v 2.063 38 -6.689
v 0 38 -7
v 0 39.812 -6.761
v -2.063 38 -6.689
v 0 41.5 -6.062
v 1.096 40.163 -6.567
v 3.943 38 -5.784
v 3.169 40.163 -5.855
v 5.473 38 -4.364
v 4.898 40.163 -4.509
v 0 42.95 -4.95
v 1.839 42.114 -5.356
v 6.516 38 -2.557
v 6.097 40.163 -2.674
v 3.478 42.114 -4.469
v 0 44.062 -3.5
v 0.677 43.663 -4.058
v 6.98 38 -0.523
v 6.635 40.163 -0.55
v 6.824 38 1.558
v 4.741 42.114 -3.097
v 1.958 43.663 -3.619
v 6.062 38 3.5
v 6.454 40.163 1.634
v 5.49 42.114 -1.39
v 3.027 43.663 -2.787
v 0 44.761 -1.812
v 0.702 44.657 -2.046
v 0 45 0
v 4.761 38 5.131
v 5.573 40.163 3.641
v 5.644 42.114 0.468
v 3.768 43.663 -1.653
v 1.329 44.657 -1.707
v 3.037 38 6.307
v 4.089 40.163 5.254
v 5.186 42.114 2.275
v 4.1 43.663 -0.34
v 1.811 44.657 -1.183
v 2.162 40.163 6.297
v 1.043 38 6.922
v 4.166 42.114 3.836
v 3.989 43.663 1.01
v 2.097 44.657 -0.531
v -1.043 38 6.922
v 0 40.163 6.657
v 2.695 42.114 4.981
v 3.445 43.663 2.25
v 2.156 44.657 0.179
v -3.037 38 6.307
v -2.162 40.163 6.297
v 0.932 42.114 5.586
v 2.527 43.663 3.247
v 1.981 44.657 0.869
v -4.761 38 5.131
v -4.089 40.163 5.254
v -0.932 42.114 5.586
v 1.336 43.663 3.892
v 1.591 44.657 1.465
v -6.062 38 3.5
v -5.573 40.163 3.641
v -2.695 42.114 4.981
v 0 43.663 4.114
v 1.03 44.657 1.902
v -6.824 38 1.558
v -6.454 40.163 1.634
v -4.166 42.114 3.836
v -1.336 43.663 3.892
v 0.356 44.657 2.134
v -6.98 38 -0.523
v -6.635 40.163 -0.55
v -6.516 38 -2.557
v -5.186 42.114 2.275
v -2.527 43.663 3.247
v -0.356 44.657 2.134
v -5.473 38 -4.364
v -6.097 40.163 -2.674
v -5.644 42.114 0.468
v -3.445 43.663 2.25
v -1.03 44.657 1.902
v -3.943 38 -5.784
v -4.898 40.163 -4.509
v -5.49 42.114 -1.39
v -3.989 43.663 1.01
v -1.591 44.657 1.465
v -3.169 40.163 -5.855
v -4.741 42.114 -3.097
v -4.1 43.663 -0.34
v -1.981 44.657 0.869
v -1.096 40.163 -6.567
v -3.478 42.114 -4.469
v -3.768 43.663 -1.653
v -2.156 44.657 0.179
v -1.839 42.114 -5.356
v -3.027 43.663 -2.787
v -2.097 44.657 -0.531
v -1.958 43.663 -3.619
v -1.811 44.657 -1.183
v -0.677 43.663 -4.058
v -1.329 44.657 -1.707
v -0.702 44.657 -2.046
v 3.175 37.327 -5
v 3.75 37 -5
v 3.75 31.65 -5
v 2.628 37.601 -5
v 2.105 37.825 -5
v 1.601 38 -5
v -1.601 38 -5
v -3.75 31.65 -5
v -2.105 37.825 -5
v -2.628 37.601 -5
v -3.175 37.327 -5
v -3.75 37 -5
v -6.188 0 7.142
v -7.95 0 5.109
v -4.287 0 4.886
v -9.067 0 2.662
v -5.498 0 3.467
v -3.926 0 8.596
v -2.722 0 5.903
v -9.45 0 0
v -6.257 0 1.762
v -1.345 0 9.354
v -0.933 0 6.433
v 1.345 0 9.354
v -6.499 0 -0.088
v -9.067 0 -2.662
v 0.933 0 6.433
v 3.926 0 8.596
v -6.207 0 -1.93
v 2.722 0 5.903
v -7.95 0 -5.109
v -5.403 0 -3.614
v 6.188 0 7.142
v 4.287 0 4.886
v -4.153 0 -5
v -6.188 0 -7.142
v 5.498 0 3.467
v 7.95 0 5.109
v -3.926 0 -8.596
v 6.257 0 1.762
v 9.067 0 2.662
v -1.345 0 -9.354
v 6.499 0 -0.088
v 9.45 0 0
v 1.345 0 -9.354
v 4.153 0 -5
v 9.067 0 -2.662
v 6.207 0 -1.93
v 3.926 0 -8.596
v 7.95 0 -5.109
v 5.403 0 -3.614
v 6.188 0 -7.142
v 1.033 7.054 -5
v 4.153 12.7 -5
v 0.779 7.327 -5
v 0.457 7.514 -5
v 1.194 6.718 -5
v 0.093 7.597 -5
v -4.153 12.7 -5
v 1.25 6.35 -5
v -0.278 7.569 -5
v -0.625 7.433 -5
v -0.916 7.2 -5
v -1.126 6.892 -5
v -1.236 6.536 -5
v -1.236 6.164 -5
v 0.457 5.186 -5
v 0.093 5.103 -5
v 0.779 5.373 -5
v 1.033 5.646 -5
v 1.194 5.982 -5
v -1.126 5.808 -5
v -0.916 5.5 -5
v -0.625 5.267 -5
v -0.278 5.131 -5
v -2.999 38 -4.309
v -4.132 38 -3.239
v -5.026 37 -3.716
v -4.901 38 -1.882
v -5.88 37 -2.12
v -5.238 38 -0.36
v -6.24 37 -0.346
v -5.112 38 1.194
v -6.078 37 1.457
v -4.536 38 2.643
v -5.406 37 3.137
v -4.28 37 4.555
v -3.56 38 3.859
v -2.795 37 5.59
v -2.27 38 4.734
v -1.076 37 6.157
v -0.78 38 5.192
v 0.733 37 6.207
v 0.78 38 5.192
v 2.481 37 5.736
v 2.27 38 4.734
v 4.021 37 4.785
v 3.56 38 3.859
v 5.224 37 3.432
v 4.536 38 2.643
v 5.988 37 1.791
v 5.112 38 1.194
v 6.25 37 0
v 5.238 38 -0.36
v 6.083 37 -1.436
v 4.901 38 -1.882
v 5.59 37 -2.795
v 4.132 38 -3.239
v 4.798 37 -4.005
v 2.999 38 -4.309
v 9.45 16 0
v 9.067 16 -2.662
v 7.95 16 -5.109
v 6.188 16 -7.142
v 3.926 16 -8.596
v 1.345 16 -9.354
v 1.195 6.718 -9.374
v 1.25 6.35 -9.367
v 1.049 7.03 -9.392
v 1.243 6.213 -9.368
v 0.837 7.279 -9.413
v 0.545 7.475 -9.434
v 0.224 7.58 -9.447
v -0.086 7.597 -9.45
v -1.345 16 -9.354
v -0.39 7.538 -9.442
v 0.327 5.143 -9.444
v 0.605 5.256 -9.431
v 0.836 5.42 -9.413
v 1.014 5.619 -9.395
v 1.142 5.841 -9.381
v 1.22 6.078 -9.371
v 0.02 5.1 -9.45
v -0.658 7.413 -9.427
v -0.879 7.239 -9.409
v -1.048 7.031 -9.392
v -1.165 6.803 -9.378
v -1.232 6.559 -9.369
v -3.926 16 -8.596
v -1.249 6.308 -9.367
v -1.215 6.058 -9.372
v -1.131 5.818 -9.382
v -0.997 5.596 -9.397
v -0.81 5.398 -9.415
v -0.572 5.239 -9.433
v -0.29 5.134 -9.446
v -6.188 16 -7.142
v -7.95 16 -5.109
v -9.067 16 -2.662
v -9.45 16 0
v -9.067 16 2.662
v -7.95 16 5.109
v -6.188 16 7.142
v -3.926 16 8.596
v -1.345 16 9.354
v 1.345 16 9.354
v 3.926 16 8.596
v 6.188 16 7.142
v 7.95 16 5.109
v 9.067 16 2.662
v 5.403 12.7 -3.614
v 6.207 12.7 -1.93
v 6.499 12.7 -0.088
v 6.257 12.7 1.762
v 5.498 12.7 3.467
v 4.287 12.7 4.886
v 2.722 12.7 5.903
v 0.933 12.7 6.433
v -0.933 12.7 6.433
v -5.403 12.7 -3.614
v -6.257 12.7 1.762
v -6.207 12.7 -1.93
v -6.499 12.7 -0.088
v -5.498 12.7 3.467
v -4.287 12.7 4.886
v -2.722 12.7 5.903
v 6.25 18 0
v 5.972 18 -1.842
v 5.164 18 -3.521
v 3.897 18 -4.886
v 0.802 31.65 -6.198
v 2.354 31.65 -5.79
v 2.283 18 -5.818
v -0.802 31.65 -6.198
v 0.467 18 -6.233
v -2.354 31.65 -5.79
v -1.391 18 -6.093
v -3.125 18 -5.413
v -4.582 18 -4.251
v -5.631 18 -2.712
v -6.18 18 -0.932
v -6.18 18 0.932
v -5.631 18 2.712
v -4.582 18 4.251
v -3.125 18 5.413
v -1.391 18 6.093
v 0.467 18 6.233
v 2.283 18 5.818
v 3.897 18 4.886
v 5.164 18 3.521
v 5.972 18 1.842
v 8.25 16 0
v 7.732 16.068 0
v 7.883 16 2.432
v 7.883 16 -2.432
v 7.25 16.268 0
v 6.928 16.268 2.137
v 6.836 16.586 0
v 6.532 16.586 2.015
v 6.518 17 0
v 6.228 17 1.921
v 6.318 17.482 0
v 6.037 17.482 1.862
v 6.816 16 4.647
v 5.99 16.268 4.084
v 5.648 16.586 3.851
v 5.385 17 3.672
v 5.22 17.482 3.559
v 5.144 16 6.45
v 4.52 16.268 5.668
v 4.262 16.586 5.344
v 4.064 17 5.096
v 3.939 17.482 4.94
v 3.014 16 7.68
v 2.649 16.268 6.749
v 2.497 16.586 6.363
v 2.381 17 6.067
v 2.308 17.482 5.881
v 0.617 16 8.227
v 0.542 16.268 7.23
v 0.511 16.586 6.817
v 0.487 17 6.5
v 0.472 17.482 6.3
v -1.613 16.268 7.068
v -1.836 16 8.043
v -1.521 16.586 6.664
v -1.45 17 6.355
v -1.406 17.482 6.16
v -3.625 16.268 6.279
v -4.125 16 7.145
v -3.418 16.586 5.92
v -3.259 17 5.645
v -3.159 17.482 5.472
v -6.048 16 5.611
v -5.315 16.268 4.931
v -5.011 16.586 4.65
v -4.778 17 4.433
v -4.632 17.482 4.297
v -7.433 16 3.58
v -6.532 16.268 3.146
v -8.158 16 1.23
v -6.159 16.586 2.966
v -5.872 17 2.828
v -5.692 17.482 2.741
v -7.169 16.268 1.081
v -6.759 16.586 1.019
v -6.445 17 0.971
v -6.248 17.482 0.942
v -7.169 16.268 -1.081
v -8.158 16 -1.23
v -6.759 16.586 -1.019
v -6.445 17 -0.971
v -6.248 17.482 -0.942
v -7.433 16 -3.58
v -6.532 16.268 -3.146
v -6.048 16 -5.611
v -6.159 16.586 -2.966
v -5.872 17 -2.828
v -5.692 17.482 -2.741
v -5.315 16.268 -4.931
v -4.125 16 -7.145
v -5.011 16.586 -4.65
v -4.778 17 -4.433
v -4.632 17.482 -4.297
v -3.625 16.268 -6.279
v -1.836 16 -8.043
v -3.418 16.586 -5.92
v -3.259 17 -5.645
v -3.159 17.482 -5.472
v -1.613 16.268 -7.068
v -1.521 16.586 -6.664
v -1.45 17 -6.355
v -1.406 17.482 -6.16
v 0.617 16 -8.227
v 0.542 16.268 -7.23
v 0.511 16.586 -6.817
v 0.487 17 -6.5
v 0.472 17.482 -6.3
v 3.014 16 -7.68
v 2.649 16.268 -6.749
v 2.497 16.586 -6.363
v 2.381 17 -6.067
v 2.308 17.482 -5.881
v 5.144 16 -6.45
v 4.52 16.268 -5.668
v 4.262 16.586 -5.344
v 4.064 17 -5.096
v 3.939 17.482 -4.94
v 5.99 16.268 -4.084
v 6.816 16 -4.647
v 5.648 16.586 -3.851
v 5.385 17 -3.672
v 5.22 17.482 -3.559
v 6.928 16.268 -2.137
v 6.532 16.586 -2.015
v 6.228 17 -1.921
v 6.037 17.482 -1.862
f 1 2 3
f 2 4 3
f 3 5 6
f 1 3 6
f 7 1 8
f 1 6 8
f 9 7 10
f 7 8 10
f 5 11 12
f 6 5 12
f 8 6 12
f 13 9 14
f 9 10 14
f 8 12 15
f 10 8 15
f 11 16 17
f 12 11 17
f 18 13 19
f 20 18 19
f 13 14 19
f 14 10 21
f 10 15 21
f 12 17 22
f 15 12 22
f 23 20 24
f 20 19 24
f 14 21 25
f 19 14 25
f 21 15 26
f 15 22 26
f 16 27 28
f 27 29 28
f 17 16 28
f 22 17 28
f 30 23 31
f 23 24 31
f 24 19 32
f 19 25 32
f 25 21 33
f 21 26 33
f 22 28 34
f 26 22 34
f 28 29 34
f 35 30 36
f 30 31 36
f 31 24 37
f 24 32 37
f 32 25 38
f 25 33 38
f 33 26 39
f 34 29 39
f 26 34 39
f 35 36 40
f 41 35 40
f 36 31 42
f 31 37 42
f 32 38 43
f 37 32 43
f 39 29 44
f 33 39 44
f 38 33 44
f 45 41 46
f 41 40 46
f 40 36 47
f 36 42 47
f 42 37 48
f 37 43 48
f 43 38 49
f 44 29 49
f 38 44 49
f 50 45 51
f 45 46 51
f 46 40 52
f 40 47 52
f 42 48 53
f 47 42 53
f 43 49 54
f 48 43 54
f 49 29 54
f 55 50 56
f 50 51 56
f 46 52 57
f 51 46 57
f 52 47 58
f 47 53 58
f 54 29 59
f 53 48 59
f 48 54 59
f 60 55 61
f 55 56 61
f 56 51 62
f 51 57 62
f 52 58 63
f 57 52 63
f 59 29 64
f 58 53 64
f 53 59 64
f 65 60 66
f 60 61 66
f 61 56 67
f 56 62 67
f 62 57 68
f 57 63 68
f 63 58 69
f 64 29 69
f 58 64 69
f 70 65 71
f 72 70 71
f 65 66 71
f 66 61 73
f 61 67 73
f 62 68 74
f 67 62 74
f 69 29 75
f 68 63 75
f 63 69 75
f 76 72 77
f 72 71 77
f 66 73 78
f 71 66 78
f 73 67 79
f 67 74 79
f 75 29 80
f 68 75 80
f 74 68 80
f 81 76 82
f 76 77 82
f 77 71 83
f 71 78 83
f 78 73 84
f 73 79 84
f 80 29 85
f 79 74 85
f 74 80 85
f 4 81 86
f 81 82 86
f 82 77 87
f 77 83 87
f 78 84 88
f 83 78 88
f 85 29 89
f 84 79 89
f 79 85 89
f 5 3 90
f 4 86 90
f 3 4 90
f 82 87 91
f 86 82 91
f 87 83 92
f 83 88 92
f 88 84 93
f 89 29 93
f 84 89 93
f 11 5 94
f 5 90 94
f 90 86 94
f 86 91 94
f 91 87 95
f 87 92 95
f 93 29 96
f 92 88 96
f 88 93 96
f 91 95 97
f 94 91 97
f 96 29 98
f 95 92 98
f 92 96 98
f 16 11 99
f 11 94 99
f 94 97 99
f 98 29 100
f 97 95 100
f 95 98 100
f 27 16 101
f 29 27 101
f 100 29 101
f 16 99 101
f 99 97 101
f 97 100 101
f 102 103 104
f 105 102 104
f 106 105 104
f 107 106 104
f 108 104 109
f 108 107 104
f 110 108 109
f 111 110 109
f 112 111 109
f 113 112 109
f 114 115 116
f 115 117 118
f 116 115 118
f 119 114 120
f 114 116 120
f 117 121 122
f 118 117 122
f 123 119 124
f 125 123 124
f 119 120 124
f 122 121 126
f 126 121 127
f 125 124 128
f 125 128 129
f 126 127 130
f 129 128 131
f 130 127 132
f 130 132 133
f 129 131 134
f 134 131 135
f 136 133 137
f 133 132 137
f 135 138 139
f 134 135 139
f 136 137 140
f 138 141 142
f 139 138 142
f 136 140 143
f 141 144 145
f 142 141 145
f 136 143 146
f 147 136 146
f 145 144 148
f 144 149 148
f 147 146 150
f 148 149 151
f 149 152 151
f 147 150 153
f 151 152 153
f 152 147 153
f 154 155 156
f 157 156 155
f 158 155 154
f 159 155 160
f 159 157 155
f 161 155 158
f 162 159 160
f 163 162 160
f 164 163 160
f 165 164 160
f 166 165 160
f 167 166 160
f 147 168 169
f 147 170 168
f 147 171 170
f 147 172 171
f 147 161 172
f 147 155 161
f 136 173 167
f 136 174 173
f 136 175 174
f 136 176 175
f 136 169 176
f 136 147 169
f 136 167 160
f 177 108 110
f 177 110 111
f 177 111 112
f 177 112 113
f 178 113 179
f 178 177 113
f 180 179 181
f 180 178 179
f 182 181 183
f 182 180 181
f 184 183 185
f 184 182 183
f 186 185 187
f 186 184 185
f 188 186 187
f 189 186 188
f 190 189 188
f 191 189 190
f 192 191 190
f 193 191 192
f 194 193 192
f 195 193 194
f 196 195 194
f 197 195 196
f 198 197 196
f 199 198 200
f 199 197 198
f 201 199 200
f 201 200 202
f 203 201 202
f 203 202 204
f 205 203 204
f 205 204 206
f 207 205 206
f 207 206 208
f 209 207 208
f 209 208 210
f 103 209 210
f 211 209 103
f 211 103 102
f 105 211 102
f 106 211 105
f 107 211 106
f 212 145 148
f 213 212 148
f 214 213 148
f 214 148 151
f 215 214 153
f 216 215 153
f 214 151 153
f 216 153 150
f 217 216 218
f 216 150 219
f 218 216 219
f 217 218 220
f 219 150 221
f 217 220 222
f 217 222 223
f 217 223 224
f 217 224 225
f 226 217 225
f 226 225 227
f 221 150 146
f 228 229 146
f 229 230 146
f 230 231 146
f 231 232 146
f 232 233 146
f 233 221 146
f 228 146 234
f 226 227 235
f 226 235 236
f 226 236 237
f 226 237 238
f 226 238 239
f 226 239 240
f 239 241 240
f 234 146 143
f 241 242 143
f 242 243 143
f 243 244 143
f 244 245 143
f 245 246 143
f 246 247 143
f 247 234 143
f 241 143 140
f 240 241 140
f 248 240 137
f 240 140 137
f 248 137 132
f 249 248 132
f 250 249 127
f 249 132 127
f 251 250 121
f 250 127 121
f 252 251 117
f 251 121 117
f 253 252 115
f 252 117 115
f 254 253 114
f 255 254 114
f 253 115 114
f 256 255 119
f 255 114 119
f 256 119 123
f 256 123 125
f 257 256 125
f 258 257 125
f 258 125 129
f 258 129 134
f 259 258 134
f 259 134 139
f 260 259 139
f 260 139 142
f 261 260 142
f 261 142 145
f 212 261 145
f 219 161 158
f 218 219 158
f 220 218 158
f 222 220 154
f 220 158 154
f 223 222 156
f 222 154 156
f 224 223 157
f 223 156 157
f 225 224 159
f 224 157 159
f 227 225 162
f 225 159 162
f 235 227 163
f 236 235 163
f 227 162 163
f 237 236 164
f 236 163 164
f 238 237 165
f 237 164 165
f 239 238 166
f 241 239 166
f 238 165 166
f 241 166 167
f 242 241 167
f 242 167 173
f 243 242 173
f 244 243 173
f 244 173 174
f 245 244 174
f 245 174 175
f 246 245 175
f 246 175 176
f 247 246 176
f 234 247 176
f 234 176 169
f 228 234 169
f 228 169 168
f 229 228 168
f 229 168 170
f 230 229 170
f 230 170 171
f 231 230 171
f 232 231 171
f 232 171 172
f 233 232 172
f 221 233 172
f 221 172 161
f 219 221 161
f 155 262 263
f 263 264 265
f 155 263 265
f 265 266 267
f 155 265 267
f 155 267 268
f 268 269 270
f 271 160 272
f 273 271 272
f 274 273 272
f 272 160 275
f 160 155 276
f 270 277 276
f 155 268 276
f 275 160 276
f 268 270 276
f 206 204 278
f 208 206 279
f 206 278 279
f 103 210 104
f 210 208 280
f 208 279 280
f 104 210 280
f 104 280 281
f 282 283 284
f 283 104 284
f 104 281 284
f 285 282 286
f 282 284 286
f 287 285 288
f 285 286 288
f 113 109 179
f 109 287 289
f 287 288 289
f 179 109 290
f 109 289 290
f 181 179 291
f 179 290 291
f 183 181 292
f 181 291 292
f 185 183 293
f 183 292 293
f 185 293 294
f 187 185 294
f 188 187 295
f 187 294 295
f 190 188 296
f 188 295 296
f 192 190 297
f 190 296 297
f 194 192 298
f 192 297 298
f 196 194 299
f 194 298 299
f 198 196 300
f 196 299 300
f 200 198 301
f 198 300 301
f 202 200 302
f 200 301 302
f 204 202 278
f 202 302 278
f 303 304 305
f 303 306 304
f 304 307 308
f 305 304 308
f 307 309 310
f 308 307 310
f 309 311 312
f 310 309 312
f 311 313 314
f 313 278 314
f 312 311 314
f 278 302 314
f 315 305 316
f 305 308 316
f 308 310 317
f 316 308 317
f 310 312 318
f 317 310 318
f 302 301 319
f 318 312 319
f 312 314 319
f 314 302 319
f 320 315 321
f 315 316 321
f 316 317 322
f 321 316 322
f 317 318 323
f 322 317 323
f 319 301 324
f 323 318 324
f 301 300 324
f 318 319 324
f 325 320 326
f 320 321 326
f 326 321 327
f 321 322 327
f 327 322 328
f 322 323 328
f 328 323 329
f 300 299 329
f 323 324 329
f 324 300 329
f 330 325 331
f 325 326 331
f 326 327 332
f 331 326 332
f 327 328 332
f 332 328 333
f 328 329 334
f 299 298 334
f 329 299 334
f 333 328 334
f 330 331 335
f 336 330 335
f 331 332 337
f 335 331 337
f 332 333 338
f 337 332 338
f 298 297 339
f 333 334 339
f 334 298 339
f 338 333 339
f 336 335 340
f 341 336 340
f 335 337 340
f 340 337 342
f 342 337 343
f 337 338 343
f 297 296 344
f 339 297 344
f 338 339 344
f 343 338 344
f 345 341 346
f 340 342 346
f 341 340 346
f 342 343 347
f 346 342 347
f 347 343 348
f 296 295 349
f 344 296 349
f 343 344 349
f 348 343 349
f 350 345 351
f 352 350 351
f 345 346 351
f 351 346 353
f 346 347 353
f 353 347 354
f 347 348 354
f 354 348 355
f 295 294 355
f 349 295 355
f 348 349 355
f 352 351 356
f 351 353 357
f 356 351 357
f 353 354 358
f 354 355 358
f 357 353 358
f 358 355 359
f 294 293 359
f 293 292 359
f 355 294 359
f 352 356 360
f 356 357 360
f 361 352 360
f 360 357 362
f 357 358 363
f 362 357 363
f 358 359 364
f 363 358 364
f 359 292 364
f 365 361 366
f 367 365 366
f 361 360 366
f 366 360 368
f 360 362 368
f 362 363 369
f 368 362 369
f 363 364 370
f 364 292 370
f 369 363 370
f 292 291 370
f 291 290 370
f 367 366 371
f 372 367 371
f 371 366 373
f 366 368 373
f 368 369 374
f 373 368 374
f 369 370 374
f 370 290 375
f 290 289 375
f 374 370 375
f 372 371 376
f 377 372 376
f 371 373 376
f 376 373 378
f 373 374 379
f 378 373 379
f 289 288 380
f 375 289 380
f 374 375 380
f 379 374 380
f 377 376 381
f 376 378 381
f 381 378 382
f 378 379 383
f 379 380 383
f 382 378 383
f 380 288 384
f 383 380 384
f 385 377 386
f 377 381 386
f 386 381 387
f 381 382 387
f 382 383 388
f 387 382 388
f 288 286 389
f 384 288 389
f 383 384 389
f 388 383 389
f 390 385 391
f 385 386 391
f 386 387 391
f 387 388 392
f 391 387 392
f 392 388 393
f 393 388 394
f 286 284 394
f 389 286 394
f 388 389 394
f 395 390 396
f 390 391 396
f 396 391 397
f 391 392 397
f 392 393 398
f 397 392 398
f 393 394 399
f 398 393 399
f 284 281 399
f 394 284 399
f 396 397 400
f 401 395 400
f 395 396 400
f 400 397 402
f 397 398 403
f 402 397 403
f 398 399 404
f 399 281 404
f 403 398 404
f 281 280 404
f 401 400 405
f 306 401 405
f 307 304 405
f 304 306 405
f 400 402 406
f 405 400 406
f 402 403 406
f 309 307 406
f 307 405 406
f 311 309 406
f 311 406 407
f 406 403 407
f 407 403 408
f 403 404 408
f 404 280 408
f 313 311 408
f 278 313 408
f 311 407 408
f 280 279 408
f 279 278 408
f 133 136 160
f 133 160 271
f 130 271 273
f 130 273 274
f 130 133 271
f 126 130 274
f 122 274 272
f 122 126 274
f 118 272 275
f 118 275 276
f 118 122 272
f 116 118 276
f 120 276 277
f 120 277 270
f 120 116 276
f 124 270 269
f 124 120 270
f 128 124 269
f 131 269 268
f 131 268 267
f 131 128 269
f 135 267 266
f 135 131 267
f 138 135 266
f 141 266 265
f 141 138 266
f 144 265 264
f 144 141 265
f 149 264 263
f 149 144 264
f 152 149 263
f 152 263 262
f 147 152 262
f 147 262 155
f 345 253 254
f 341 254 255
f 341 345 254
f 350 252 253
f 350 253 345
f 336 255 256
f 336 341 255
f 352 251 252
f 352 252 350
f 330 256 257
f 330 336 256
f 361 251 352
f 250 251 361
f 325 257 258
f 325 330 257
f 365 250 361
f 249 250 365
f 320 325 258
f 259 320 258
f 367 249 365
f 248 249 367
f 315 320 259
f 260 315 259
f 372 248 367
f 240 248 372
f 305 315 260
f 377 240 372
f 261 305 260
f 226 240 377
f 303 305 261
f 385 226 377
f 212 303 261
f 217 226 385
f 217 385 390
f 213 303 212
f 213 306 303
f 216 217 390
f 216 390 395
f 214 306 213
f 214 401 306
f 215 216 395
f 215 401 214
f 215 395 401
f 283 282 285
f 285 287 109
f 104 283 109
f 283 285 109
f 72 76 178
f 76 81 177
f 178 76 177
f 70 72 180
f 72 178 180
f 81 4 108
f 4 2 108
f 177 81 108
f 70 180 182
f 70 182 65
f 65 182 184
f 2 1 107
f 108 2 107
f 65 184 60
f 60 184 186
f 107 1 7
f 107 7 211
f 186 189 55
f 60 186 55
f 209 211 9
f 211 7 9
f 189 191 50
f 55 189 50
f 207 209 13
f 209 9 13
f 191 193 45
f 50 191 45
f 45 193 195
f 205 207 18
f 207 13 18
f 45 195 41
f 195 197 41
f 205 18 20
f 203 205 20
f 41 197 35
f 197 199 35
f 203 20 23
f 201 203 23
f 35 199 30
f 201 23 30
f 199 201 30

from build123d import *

# Parameters (mm, degrees)
SKETCH1_R               = 6.25
BOSS_EXTRUDE1_DEPTH     = 38
SKETCH1_3_R             = 9.45
BOSS_EXTRUDE2_DEPTH     = 16
FILLET1_R               = 2
CHAMFER1_SIZE           = 1
CUT_EXTRUDE4_START      = 6.35
CUT_EXTRUDE4_DEPTH      = 6.35
CUT_EXTRUDE5_DEPTH      = 12.7
CUT_EXTRUDE6_REACH      = 50.199
CUT_EXTRUDE6_END_RADIUS = 9.45
SKETCH6_R               = 1.25


with BuildPart() as part:
    # Sketch1 → Boss-Extrude1 (new body)
    with BuildSketch(Plane(origin=(0, 0, 0), x_dir=(1, 0, 0), z_dir=(0, 1, 0))):
        Circle(SKETCH1_R)
    extrude(amount=BOSS_EXTRUDE1_DEPTH)

    # Sketch1<3> → Boss-Extrude2 (add)
    with BuildSketch(Plane(origin=(0, 0, 0), x_dir=(1, 0, 0), z_dir=(0, 1, 0))):
        Circle(SKETCH1_3_R)
    extrude(amount=BOSS_EXTRUDE2_DEPTH)

    # Fillet1
    fillet1_edges = [part.edges().sort_by_distance(p)[0] for p in [
        (-6.25, 16, 0),
    ]]
    fillet(fillet1_edges, radius=FILLET1_R)

    # Chamfer1
    chamfer1_edges = [part.edges().sort_by_distance(p)[0] for p in [
        (-6.25, 38, 0),
    ]]
    chamfer(chamfer1_edges, length=CHAMFER1_SIZE)

    # Sketch2 → Revolve1 (revolve)
    with BuildSketch(Plane(origin=(0, 0, 0), x_dir=(0, 0, -1), z_dir=(1, 0, 0))):
        with BuildLine():
            Line((0, 45), (0, 38))
            Line((0, 38), (7, 38))
            ThreePointArc((7, 38), (4.949747468, 42.949747468), (0, 45))
        make_face()
    revolve(axis=Axis((0, 47.571975937, 0), (0, -1, 0)))

    # Sketch3 → Cut-Extrude4 (cut)
    with BuildSketch(Plane(origin=(0, 38, 0), x_dir=(-1, 0, 0), z_dir=(0, -1, 0)).offset(CUT_EXTRUDE4_START)):
        with BuildLine():
            Line((-3.75, 5), (3.75, 5))
            ThreePointArc((3.75, 5), (0, 6.25), (-3.75, 5))
        make_face()
    extrude(amount=-CUT_EXTRUDE4_DEPTH, mode=Mode.SUBTRACT)

    # Sketch5 → Cut-Extrude5 (cut)
    with BuildSketch(Plane.XZ):
        with BuildLine():
            Line((4.153311931, -5), (-4.153311931, -5))
            ThreePointArc((-4.153311931, -5), (0, 6.5), (4.153311931, -5))
        make_face()
    extrude(amount=-CUT_EXTRUDE5_DEPTH, mode=Mode.SUBTRACT)

    # Cut-Extrude6: up to this cylinder (the profile starts inside it)
    cut_extrude6_end = Plane(origin=(0, 6.35, 0), z_dir=(0, -1, 0)) * Cylinder(CUT_EXTRUDE6_END_RADIUS, 120.298, mode=Mode.PRIVATE)
    # Sketch6 → Cut-Extrude6 (cut, up to the surface)
    with BuildSketch(Plane.XY.offset(-5), mode=Mode.PRIVATE) as cut_extrude6_sk1:
        with Locations((0, 6.35)):
            Circle(SKETCH6_R)
    cut_extrude6_tool1 = extrude(cut_extrude6_sk1.sketch, amount=-CUT_EXTRUDE6_REACH, mode=Mode.PRIVATE) & cut_extrude6_end
    add(cut_extrude6_tool1.solids().sort_by_distance((0, 6.35, -5))[0], mode=Mode.SUBTRACT)


solid = part.part
